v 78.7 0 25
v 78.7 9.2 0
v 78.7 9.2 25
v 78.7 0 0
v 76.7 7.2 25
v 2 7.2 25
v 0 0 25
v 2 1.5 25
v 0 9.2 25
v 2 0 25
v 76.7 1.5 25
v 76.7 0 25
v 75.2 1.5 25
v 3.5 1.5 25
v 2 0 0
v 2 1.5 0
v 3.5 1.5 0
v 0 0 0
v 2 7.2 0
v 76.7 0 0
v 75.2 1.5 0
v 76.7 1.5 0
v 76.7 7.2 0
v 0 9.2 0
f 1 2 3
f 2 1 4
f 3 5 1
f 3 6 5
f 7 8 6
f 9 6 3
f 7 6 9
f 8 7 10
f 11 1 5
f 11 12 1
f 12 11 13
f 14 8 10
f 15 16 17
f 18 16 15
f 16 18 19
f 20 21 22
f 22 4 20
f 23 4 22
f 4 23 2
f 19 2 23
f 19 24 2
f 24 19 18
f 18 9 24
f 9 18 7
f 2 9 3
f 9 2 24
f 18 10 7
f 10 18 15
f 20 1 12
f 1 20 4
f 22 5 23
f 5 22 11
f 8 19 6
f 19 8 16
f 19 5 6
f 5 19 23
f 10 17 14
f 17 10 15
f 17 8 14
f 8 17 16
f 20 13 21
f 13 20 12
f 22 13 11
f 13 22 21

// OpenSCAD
// Raspberry pi, smaller type, holder

// Main dimensions
inner_length = 65.5+7+2;
inner_width = 5;
wall_thickness = 2;
height = 25;
lip_height = 1.5;
lip_overhang = 1.5;

// Tolerances
clearance = 0.2;  // Gap between bracket and block
print_tolerance = 0.4;  // Manufacturing tolerance
epsilon = 0.01;  // Boolean operation margin

// Adjusted dimensions including clearance
adjusted_length = inner_length + clearance;
adjusted_width = inner_width + clearance;

// Main body of U bracket
module main_body() {
    difference() {
        // Outer shell
        cube([adjusted_length + 2*wall_thickness, 
              adjusted_width + 2*wall_thickness, 
              height]);
        
        // Inner cutout - slightly taller and deeper for clean boolean
        translate([wall_thickness, wall_thickness, -epsilon])
            cube([adjusted_length, 
                  adjusted_width, 
                  height + 2*epsilon]);
        
        // Front opening - slightly wider and taller for clean boolean
        translate([wall_thickness, -epsilon, -epsilon])
            cube([adjusted_length, 
                  wall_thickness + 2*epsilon, 
                  height + 2*epsilon]);
        
    }
}

// Single retention lip as a 2D profile to be extruded
module lip_profile() {
    polygon(points=[
        [0,0],                     // start at base
        [0,lip_height],            // up the wall
        [-lip_overhang,lip_height]          // angled retention feature
    ]);
}

// Both retention lips
module retention_lips() {
    // Left arm lip
    translate([wall_thickness , 
   0, height])
        rotate([0, 180, 0])
            linear_extrude(height=height)
                lip_profile();
    
    // Right arm lip
    translate([adjusted_length + wall_thickness, 0, 0])

            linear_extrude(height=height)
                lip_profile();
}

// Final assembly
module u_bracket() {
    union() {
        main_body();
        retention_lips();
    }
}

// Render the bracket
u_bracket();
